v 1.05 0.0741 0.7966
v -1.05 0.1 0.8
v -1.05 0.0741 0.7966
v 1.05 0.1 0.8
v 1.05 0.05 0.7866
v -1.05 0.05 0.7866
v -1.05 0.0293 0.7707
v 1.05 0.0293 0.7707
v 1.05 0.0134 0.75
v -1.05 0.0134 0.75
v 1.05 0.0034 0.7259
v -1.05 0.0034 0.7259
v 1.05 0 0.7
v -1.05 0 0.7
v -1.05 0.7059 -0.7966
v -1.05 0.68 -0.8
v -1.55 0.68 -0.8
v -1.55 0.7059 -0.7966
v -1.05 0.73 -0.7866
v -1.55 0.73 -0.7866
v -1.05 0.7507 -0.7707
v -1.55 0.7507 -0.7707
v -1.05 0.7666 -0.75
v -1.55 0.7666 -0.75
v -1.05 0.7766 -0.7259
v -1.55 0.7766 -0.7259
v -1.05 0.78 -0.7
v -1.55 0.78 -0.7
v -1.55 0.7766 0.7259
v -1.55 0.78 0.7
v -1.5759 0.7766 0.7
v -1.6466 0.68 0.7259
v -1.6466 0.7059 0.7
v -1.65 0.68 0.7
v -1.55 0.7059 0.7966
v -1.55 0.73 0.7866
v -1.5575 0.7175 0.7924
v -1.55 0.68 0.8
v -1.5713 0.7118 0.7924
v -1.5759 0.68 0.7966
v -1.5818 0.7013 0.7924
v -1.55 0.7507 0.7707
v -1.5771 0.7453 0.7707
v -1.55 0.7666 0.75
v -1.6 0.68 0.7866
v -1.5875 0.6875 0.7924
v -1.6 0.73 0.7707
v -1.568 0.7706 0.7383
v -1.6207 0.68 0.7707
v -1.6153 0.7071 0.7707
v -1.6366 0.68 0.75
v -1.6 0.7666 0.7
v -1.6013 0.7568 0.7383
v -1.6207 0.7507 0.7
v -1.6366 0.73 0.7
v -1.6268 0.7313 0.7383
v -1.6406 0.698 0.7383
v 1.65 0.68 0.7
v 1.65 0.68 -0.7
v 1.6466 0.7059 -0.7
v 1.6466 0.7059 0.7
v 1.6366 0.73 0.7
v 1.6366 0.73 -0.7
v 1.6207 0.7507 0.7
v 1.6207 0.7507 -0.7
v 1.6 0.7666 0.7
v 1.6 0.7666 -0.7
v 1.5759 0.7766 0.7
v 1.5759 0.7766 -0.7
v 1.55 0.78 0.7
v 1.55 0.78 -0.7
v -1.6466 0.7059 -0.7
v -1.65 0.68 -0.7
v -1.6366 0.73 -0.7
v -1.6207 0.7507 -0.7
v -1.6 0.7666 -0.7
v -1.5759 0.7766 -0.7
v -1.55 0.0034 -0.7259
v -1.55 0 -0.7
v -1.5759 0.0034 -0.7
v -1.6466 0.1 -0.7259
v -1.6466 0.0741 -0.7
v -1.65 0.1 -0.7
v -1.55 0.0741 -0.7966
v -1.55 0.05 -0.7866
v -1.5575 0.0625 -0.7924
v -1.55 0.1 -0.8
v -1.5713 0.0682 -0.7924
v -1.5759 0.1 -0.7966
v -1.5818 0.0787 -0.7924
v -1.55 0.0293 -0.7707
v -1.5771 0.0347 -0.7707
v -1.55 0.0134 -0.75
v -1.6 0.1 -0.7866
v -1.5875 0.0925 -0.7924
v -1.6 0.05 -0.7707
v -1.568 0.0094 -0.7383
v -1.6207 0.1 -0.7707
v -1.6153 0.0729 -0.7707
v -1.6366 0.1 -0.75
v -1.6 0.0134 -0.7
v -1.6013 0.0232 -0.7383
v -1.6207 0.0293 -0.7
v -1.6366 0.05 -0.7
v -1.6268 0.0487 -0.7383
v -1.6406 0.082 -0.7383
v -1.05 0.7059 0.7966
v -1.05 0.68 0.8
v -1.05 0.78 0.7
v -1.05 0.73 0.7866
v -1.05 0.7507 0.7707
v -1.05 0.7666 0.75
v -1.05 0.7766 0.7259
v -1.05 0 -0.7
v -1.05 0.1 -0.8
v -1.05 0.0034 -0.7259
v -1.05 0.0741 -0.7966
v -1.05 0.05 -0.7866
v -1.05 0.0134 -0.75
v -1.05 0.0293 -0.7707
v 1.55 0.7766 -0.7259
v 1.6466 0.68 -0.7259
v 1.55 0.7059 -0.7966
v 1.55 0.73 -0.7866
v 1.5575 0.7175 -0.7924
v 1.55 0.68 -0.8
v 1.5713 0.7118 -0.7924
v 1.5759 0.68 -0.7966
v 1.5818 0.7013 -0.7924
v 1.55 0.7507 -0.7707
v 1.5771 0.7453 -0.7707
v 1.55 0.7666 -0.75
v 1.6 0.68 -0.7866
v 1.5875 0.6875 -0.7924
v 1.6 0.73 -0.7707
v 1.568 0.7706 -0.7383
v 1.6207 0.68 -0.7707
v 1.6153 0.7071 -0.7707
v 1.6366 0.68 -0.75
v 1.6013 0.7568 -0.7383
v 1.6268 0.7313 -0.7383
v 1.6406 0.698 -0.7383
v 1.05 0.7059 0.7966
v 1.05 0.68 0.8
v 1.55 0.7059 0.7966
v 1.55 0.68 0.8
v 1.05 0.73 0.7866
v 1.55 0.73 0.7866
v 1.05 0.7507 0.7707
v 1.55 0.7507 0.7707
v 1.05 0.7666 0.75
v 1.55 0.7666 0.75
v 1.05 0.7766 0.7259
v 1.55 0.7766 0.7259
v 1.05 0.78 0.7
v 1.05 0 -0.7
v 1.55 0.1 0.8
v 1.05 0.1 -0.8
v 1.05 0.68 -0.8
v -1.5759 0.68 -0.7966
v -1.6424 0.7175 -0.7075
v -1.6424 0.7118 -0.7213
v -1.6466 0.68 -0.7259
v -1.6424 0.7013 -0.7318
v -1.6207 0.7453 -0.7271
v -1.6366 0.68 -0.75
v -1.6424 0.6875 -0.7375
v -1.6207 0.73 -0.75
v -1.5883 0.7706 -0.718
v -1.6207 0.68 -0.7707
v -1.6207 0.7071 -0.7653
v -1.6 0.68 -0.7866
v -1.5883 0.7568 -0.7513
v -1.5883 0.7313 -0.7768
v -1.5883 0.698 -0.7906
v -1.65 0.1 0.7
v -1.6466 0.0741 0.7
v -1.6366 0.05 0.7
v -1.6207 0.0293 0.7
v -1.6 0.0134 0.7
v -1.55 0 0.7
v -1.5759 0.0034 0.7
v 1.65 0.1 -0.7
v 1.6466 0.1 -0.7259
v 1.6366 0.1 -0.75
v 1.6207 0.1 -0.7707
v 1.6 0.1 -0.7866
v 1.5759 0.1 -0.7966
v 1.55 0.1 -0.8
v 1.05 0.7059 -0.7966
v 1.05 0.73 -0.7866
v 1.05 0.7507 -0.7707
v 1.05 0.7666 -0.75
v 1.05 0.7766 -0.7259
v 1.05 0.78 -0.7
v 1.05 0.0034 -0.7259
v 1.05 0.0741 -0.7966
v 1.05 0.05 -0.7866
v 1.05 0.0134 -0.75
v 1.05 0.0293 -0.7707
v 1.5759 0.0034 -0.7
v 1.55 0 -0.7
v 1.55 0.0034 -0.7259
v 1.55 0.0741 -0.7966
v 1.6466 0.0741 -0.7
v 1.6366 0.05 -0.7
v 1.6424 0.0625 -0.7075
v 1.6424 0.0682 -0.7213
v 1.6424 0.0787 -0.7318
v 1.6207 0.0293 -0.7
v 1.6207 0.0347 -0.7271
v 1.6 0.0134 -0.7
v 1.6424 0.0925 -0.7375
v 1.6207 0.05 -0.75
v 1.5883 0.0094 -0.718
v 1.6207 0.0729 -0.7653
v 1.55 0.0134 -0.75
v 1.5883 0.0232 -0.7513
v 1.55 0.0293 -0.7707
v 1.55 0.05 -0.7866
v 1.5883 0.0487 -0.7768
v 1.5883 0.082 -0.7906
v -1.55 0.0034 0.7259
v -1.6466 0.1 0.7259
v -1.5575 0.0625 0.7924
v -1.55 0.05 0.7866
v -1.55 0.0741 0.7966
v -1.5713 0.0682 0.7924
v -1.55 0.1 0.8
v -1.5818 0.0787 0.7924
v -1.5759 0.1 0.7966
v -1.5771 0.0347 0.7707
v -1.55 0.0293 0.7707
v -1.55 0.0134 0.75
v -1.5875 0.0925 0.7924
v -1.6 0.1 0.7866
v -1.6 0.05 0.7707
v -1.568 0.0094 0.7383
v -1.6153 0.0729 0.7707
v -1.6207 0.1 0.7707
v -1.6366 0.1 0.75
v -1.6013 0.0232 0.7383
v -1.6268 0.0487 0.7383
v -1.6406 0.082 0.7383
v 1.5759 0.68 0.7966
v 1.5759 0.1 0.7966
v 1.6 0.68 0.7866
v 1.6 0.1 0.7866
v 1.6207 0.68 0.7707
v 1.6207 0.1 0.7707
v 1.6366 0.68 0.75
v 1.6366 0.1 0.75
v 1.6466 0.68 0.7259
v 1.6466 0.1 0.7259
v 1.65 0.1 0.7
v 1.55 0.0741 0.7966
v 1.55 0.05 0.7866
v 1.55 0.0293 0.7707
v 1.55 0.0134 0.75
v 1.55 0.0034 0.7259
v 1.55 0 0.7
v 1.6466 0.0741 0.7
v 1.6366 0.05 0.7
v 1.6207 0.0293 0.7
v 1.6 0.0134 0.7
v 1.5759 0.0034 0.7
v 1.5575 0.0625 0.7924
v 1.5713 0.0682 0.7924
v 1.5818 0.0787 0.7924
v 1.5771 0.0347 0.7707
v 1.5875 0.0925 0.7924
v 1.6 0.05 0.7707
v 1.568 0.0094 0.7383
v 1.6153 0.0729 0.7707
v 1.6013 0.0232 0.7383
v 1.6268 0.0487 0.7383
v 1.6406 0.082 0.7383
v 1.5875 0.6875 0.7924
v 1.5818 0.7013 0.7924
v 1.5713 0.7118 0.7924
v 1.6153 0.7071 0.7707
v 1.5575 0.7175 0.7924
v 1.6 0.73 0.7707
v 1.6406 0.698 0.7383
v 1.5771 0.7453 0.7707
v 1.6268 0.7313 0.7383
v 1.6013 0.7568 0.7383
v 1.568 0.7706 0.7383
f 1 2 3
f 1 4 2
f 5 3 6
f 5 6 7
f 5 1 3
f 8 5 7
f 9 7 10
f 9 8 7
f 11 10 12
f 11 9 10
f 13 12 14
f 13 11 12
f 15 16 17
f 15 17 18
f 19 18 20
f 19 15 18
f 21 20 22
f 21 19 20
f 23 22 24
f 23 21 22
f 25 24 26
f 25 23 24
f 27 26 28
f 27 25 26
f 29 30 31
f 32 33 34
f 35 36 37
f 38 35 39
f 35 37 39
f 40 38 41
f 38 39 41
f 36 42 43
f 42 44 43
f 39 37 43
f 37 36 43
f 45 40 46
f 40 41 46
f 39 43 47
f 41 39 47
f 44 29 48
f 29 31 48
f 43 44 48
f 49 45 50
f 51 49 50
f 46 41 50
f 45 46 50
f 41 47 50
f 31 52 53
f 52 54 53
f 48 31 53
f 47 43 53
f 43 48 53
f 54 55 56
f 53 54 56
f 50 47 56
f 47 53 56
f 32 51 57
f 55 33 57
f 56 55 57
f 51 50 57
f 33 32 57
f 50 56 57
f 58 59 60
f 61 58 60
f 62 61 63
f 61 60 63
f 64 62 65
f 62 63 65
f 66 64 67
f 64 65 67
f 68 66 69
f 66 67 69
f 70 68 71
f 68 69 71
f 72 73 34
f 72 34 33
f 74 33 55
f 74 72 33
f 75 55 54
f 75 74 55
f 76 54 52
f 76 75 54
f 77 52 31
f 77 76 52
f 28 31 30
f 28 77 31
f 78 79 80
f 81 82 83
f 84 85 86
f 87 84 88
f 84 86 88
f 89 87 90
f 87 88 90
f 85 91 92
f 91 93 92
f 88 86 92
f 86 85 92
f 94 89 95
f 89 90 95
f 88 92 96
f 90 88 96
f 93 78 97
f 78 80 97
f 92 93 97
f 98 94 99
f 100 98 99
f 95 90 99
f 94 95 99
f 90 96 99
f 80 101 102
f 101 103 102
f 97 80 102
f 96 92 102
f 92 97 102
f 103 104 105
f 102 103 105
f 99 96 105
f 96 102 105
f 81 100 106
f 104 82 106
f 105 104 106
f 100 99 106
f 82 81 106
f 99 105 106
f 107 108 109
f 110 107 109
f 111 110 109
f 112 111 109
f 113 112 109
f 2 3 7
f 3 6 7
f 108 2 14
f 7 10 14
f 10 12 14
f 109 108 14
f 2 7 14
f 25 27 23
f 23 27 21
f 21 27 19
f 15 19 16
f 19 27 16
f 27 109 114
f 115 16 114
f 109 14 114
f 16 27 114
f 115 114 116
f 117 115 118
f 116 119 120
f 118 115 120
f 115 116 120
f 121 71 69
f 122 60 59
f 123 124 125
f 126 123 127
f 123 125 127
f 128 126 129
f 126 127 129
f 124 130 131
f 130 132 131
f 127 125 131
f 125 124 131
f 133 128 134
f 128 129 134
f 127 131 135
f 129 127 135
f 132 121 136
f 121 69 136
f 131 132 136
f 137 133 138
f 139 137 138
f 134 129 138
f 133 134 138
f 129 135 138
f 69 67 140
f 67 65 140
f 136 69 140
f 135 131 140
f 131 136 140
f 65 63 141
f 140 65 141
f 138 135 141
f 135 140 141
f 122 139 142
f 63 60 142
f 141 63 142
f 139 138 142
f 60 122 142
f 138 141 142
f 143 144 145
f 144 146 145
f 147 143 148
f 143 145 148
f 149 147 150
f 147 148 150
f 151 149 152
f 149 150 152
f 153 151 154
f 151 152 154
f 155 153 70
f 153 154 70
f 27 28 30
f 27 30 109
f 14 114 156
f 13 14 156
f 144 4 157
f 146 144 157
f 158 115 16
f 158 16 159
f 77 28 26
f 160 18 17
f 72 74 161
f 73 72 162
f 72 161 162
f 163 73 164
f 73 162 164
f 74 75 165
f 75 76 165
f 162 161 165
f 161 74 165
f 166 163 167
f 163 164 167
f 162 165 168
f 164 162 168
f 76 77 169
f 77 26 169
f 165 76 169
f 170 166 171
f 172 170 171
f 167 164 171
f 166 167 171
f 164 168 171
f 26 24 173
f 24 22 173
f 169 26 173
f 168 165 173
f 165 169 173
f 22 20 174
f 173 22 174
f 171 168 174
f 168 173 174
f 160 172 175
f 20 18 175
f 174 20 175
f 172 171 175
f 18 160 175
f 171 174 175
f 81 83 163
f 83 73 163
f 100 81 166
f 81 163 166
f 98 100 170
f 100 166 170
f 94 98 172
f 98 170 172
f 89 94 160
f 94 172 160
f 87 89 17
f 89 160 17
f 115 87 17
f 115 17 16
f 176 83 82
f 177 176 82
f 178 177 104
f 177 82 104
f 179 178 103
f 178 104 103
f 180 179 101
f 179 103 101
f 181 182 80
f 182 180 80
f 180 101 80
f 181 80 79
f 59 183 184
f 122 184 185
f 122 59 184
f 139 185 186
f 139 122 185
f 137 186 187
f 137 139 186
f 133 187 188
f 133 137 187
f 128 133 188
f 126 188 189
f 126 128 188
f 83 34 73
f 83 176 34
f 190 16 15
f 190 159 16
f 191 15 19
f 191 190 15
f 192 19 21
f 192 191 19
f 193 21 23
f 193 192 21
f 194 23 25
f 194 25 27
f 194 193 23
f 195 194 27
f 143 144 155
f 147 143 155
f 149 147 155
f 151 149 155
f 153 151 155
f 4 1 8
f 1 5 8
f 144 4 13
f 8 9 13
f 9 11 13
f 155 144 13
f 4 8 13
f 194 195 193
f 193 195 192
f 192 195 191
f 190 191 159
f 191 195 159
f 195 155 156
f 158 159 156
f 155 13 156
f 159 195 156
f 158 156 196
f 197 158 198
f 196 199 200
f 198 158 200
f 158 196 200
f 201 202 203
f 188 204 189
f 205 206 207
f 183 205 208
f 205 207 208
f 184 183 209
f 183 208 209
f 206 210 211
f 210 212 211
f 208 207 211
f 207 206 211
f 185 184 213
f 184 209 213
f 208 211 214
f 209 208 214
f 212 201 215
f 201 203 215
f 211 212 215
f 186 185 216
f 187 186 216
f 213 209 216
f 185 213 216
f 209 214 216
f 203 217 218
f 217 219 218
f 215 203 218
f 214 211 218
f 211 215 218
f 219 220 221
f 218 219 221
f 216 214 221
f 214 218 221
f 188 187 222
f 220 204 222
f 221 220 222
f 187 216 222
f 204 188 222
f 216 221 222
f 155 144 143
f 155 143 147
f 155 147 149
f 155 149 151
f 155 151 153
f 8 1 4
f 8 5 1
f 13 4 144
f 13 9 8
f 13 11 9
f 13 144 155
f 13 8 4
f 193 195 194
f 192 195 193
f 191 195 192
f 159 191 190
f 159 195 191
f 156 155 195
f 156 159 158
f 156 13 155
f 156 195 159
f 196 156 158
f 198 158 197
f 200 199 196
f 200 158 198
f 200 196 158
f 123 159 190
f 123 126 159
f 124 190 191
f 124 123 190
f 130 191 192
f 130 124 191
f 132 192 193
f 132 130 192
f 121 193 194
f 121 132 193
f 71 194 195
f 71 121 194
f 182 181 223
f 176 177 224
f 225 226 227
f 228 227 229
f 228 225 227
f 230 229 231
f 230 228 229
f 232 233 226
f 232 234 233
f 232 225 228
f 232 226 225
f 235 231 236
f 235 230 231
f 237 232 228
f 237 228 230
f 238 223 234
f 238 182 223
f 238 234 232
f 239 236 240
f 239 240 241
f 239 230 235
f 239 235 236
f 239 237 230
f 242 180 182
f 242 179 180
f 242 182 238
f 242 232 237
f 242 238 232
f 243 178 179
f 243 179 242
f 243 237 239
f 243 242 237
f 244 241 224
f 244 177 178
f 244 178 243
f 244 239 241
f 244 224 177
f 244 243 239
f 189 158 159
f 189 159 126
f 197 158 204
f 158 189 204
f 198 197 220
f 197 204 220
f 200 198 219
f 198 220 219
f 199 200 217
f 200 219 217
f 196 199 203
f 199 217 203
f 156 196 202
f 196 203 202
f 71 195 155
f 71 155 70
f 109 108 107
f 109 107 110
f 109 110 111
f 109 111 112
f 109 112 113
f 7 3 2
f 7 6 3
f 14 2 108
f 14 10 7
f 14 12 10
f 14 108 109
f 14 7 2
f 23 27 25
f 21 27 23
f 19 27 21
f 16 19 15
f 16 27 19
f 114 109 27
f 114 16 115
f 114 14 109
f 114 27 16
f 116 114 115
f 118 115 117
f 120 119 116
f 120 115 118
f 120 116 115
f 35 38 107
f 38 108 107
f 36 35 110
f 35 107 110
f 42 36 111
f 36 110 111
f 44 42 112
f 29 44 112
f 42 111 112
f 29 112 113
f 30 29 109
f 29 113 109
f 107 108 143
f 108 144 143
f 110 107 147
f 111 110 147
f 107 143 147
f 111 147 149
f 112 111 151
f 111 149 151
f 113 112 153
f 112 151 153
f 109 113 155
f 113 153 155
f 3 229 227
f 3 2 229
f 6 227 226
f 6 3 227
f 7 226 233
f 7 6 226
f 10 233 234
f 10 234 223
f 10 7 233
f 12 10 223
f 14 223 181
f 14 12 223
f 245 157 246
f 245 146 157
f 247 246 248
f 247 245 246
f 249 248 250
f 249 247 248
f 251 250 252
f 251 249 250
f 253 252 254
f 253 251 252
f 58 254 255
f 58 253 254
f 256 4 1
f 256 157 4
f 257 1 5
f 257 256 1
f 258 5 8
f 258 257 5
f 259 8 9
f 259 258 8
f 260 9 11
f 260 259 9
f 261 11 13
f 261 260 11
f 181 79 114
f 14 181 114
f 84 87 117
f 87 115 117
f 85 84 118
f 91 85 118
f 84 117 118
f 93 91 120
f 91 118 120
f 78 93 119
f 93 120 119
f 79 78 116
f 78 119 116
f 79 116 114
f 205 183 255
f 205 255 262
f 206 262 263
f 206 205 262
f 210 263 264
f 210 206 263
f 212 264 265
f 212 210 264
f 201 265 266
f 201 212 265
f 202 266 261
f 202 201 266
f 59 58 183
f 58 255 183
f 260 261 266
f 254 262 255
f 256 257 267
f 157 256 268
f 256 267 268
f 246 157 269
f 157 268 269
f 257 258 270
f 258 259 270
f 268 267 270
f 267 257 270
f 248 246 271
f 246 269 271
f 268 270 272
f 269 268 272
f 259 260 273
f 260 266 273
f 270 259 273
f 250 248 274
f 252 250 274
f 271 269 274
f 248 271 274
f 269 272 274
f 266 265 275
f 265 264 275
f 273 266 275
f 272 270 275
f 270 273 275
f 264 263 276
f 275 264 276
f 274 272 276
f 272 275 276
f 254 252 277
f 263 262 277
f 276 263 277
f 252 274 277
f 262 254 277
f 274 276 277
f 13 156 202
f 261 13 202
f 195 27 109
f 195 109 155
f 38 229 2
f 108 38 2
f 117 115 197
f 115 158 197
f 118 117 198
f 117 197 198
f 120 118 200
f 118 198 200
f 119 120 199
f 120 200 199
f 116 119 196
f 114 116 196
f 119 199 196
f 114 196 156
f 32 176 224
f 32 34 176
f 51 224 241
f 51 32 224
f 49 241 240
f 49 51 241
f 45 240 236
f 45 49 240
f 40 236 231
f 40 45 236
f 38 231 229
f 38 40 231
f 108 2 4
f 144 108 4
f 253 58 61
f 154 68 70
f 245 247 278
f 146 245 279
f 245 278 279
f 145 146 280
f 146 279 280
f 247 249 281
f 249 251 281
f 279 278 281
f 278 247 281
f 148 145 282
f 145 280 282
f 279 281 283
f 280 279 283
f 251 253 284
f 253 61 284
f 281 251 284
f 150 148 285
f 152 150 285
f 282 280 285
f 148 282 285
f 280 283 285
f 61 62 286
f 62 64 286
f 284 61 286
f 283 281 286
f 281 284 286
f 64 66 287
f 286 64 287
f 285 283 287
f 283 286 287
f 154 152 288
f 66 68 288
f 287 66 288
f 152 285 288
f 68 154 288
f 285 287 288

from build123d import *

# Parameters (mm, degrees)
CROQUIS1_W                = 2.1
CROQUIS1_H                = 1.6
SALIENTE_EXTRUIR1_DEPTH   = 0.78
CROQUIS3_W                = 0.6
CROQUIS3_H                = 1.6
SALIENTE_EXTRUIR3_DEPTH   = 0.78
SALIENTE_EXTRUIR3_2_DEPTH = 0.78
REDONDEO2_R               = 0.1
REDONDEO4_R               = 0.1
REDONDEO5_R               = 0.1


with BuildPart() as part:
    # Croquis1 → Saliente-Extruir1 (new body)
    with BuildSketch(Plane(origin=(0, 0, 0), x_dir=(1, 0, 0), z_dir=(0, 1, 0))):
        Rectangle(CROQUIS1_W, CROQUIS1_H)
    extrude(amount=SALIENTE_EXTRUIR1_DEPTH)

    # Redondeo2
    redondeo2_edges = [part.edges().sort_by_distance(p)[0] for p in [
        (0, 0.78, 0.8),
        (0, 0, 0.8),
        (0, 0, -0.8),
        (0, 0.78, -0.8),
    ]]
    fillet(redondeo2_edges, radius=REDONDEO2_R)


with BuildPart() as body_2:
    # Croquis3 → Saliente-Extruir3 (new body)
    with BuildSketch(Plane(origin=(0, 0, 0), x_dir=(1, 0, 0), z_dir=(0, 1, 0))):
        with Locations((1.35, 0)):
            Rectangle(CROQUIS3_W, CROQUIS3_H)
    extrude(amount=SALIENTE_EXTRUIR3_DEPTH)

    # Redondeo4
    redondeo4_edges = [body_2.edges().sort_by_distance(p)[0] for p in [
        (1.65, 0.78, 0),
        (1.35, 0.78, -0.8),
        (1.35, 0, -0.8),
        (1.65, 0, 0),
        (1.35, 0, 0.8),
        (1.65, 0.39, -0.8),
        (1.65, 0.39, 0.8),
        (1.35, 0.78, 0.8),
    ]]
    fillet(redondeo4_edges, radius=REDONDEO4_R)


with BuildPart() as body_3:
    # Croquis3 → Saliente-Extruir3 2 (new body)
    with BuildSketch(Plane(origin=(0, 0, 0), x_dir=(1, 0, 0), z_dir=(0, 1, 0))):
        with Locations((-1.35, 0)):
            Rectangle(CROQUIS3_W, CROQUIS3_H)
    extrude(amount=SALIENTE_EXTRUIR3_2_DEPTH)

    # Redondeo5
    redondeo5_edges = [body_3.edges().sort_by_distance(p)[0] for p in [
        (-1.35, 0.78, -0.8),
        (-1.65, 0.78, 0),
        (-1.35, 0.78, 0.8),
        (-1.65, 0, 0),
        (-1.35, 0, -0.8),
        (-1.35, 0, 0.8),
        (-1.65, 0.39, 0.8),
        (-1.65, 0.39, -0.8),
    ]]
    fillet(redondeo5_edges, radius=REDONDEO5_R)


solid = Compound([part.part, body_2.part, body_3.part])
